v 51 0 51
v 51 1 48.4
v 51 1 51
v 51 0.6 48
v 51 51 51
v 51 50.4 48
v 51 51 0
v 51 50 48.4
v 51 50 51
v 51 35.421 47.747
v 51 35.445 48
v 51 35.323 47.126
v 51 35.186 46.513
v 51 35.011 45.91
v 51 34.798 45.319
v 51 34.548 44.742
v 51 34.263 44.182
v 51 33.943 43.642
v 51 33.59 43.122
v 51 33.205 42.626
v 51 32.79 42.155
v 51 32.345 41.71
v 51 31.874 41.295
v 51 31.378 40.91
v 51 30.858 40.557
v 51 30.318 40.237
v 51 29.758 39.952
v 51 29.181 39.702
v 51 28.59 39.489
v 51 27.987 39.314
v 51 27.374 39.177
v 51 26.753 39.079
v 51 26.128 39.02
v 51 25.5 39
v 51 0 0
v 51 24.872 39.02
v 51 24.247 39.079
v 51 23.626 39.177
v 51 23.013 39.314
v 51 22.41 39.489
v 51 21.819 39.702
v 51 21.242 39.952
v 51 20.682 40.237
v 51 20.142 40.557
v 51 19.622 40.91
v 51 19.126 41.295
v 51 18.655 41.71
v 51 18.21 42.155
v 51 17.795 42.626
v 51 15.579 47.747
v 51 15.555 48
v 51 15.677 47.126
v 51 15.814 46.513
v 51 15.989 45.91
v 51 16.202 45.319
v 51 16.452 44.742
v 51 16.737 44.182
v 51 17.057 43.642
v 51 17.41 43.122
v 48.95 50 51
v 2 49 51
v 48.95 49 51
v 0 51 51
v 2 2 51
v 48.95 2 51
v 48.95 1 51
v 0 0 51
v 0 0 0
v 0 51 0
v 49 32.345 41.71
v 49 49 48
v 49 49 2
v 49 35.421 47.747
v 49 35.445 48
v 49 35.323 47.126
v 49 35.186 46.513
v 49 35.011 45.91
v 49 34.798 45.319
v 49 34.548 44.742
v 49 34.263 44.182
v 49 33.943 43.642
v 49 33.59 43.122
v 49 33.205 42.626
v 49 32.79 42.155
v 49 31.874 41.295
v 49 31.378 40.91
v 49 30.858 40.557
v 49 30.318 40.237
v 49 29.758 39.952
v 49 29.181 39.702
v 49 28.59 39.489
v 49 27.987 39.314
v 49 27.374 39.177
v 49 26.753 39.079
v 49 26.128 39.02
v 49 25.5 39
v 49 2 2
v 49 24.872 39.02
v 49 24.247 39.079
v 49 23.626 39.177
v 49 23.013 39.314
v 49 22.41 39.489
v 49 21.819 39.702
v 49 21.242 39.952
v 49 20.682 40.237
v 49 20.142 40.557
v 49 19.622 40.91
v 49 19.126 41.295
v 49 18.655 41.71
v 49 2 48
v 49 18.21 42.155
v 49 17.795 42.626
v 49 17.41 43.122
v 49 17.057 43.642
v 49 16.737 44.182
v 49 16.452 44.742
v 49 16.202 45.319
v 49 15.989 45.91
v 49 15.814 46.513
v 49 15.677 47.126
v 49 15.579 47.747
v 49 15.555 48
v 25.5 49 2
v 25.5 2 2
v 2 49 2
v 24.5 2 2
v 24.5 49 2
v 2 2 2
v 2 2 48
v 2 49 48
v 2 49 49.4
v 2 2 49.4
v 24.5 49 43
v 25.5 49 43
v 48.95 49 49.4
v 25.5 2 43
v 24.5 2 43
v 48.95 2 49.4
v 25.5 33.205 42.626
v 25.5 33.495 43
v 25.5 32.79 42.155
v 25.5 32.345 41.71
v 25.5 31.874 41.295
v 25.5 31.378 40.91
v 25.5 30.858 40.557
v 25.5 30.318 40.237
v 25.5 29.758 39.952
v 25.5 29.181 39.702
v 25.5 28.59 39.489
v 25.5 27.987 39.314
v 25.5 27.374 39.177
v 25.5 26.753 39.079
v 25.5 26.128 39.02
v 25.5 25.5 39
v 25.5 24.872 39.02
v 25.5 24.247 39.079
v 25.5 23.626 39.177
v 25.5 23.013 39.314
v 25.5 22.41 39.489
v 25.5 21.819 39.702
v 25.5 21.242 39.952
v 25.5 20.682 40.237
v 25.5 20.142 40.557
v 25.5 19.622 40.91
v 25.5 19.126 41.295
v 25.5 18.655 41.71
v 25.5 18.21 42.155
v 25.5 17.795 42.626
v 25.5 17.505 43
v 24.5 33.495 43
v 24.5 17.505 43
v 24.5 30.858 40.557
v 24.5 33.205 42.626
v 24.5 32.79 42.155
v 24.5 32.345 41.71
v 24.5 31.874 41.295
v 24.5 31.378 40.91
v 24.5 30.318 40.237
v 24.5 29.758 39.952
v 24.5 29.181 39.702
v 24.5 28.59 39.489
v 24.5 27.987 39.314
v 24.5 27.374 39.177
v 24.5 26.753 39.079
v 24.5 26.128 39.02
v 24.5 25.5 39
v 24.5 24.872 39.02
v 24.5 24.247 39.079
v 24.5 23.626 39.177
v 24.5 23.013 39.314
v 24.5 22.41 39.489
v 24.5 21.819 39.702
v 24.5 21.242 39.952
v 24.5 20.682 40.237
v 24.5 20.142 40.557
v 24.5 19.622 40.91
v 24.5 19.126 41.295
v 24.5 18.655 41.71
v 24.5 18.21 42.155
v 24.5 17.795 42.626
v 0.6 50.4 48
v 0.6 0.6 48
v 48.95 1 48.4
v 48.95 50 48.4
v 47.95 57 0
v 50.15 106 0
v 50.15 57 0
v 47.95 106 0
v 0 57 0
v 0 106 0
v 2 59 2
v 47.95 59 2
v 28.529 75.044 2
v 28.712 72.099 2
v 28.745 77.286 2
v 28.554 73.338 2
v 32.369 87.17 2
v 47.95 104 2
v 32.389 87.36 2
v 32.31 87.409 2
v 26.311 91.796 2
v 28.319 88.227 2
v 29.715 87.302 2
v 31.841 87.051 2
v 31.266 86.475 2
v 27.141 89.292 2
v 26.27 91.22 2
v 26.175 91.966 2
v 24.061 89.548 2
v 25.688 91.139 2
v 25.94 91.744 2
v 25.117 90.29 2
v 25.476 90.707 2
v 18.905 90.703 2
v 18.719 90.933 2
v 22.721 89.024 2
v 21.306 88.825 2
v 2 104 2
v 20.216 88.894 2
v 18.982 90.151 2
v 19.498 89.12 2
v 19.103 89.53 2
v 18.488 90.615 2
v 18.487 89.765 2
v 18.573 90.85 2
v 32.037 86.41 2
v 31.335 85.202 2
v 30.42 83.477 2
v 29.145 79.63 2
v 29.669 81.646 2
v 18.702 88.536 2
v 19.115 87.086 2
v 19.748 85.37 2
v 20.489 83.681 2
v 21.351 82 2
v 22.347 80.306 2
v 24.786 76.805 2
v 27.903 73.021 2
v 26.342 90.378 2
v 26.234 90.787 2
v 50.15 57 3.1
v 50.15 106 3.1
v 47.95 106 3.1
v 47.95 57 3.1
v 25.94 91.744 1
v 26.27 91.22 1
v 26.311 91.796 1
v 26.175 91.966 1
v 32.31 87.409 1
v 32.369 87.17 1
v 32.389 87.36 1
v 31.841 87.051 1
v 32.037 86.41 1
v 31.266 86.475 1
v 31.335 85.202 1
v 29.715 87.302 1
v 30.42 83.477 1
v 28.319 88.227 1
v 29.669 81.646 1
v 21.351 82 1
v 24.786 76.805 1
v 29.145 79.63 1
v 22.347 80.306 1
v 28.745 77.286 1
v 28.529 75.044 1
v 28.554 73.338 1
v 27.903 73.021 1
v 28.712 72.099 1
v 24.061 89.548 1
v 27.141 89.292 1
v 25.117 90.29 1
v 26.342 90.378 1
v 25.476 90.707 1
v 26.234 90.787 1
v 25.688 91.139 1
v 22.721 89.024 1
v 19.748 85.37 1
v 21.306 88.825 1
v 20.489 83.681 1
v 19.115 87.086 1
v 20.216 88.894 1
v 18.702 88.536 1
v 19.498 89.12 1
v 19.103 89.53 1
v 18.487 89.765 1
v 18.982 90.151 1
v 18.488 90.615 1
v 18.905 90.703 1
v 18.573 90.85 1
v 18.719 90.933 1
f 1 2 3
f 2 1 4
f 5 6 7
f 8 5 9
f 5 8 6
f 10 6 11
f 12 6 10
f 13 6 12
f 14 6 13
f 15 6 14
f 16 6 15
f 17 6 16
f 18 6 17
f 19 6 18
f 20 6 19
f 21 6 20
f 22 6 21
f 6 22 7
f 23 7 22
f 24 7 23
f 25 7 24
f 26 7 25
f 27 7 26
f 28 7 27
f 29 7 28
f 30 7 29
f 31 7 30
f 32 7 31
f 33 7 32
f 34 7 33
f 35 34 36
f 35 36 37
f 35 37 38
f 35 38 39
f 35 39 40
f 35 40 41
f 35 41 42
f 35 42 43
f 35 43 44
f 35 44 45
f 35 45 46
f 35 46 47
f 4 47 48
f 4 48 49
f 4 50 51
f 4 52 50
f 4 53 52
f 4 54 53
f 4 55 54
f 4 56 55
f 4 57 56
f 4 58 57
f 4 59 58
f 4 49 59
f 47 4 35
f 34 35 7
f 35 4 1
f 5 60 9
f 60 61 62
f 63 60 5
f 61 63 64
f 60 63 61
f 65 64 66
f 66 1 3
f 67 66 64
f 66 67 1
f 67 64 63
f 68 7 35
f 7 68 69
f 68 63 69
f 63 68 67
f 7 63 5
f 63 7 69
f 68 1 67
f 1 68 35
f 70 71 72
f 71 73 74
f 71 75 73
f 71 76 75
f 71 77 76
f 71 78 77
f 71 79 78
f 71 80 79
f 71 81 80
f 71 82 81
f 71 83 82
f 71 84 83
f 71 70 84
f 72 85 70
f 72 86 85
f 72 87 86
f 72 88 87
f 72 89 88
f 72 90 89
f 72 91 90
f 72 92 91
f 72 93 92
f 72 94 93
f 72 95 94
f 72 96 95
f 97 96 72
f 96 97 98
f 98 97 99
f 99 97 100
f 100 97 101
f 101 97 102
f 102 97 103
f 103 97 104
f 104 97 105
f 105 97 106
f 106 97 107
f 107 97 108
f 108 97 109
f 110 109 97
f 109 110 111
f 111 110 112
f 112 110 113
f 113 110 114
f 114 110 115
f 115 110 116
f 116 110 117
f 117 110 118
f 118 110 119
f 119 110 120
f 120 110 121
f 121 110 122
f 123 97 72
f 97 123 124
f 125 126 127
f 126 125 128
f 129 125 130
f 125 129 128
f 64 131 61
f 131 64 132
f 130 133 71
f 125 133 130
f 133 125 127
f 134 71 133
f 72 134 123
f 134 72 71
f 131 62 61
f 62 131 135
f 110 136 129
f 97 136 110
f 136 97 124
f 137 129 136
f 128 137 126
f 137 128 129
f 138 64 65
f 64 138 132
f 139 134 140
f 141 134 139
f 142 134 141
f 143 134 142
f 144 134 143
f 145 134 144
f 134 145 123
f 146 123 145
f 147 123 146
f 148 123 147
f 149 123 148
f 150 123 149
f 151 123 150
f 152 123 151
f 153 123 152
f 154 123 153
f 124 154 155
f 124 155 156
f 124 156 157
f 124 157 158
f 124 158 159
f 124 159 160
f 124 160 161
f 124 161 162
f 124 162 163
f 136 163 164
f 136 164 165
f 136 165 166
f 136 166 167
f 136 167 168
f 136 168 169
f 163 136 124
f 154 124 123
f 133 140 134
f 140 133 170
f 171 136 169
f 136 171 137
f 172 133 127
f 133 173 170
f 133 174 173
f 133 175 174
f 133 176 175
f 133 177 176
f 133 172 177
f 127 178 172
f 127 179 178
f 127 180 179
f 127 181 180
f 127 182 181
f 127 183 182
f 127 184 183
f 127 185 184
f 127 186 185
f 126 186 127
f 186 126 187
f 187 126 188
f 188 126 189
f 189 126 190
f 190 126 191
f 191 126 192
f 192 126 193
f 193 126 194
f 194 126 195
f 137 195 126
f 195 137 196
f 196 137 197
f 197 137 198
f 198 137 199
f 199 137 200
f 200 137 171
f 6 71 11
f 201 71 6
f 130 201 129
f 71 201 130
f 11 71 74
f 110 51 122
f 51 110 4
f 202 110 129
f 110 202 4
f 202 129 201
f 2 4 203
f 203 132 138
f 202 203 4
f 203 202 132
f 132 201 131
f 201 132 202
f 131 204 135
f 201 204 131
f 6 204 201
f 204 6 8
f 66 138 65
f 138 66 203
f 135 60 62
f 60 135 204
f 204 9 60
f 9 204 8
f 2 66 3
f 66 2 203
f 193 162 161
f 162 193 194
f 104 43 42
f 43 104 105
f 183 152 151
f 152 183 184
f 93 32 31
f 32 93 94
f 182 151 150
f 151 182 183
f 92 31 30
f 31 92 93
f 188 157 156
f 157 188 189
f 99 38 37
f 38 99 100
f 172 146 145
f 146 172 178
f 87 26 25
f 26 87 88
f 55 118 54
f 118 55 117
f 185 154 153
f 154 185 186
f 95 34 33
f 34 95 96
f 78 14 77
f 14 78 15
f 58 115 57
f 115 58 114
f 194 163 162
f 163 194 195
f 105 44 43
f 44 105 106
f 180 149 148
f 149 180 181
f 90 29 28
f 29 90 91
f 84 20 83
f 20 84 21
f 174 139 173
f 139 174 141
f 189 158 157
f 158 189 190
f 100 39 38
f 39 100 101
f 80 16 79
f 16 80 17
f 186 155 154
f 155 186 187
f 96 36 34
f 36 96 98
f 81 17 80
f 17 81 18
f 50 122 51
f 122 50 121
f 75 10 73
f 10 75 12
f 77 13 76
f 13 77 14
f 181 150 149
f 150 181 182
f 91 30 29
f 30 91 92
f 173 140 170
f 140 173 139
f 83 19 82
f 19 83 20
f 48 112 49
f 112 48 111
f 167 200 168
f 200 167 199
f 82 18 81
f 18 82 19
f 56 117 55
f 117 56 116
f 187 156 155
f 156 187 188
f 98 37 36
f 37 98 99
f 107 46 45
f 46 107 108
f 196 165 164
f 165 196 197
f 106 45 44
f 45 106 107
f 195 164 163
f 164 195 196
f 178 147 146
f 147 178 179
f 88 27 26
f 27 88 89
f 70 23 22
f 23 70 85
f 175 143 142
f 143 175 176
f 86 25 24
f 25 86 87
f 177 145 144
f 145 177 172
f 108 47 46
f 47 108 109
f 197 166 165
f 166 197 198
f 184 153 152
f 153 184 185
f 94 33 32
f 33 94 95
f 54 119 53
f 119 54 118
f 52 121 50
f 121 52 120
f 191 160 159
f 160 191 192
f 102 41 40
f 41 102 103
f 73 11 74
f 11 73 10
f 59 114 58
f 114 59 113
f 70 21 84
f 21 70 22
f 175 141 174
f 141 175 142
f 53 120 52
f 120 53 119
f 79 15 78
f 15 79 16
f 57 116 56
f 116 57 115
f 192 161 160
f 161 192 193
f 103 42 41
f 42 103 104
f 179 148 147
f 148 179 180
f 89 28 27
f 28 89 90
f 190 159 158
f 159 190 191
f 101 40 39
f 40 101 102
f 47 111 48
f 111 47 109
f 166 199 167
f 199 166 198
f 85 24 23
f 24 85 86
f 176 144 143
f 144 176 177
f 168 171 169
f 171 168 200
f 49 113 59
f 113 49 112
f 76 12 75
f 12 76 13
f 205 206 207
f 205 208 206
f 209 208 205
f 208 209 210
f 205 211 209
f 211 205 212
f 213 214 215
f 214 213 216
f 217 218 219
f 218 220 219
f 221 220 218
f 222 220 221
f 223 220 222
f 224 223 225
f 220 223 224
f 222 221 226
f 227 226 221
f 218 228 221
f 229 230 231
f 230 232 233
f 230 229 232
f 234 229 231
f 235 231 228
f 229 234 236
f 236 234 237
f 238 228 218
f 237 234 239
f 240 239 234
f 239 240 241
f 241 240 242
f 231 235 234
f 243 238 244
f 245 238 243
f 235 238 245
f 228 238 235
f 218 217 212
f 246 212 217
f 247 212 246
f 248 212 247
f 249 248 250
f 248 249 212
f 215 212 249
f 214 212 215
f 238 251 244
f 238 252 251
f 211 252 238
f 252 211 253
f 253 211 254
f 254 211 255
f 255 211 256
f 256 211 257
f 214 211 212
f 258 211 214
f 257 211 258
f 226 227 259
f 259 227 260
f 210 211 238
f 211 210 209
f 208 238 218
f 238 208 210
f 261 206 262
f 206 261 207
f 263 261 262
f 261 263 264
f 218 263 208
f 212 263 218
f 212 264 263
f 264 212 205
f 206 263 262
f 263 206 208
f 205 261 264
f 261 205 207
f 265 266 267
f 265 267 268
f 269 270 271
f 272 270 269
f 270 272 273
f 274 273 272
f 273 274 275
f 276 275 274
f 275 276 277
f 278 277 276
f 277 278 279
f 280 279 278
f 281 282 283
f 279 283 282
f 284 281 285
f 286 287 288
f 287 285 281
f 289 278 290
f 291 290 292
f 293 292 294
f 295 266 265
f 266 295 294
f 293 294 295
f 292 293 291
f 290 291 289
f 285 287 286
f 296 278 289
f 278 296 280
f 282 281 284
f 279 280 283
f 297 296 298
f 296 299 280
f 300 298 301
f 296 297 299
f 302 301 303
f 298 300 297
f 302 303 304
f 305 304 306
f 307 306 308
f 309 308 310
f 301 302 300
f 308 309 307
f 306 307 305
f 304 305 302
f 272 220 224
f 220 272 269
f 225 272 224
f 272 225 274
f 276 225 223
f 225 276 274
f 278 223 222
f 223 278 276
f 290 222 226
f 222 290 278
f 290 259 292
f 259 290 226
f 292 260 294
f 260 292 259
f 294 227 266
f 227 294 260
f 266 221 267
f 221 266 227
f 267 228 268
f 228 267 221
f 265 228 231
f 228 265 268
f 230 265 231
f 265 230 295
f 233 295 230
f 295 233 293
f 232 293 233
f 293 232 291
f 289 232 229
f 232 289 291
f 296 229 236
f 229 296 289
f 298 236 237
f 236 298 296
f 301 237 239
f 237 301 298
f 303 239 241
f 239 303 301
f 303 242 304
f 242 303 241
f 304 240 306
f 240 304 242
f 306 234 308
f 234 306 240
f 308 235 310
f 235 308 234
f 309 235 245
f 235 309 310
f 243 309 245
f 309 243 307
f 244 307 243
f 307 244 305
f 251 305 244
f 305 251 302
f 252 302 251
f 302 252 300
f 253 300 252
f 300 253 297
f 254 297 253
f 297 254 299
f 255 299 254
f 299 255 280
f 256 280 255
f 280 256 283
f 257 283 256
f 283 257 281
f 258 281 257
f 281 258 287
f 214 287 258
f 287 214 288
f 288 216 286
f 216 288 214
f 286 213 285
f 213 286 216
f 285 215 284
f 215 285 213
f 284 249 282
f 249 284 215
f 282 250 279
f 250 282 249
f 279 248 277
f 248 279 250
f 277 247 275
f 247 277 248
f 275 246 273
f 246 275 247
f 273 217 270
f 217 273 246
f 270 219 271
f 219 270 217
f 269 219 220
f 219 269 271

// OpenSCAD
// file: carcassonne_box.scad
/**
 * @file carcassonne_box.scad
 * @author Conlan Wesson
 * Template for Carcossonne boxes.
 * @copyright Creative Commons Attribution-NonCommercial-ShareAlike 4.0
 */

mm = 1;
cm = 10*mm;

width = 47*mm;
thick = 2.5*mm;
wall = 2*mm;

/**
 * Lid for box.
 * @param count Number of cards.
 * @param columns Number of columns.
 * @param icon Path to icon DXF file.
 * @param rot Icon rotation in degrees.
 * @param mult Icon scale.
 * @param xoff X-offset of icon from center.
 * @param yoff Y-offset of icon from center.
 */
module carcassonne_lid(count, columns=1, icon=false, rot=0, mult=1, xoff=0, yoff=0, g=0){
	length = (thick * count) + ((width/2) - ((thick * count) % (width/2)));
	w = length+(1.5*wall)+.1;
	l = (width*columns)+wall;
	h = wall;
	d = 2;

	CubePoints = [
		[ 0-g, 0-g,   0 ],  //0
		[ w+g, 0-g,   0 ],  //1
		[ w+g, l+g,   0 ],  //2
		[ 0-g, l+g,   0 ],  //3
		[   d,   d, h+g ],  //4
		[   w,   d, h+g ],  //5
		[   w, l-d, h+g ],  //6
		[   d, l-d, h+g ]   //7
	];
	
	CubeFaces = [
		[0,1,2,3],  // bottom
		[4,5,1,0],  // front
		[7,6,5,4],  // top
		[5,6,2,1],  // right
		[6,7,3,2],  // back
		[7,4,0,3]   // left
	];
	
	
	difference(){
		union(){
			polyhedron( CubePoints, CubeFaces );
			translate([w-wall-.15,0,0]) cube([wall+.2,l, (1.5*wall)+.1]);
		}
		if(icon){
			translate([w/2+xoff,l/3+yoff,h-(wall/2)]){
				linear_extrude(height=(wall)+.1){
					rotate(rot) scale(mult) import(icon);
				}
			}
		}
	}
}

/**
 * Carcassonne card box.
 * @param count Number of cards.
 * @param dividers Array of divider positions.
 * @param columns Number of columns.
 */
module carcassonne_box(count, dividers=[], columns=1){
	length = (thick * count) + ((width/2) - ((thick * count) % (width/2)));
	difference(){
		union(){
			difference(){
				// Outer walls
				cube([length+(2*wall), (width*columns)+(2*wall), width+(2*wall)]);
				// Cavity
				translate([wall, wall, wall]){
					cube([length, width*columns, (width+wall)+.1]);
				}
			}
			// Dividers
			for(col = [0:columns-1]){
				for(div = dividers[col]){
					translate([(div*(width/2))+(wall/2), width*col+wall, 0]) cube([wall/2, width, width-(2*wall)]);
				}
				if(col > 0){
					translate([0, width*col+(wall/2), 0]) cube([length+(2*wall), wall/2, width-(2*wall)]);
				}
			}
		}
		union(){
			// Notch
			for(col = [0:columns-1]){
				translate([wall, wall+(width*col), wall]){
					translate([0, width/2, width])
					rotate([0, 90, 0]){
						cylinder(r=10, h=length+(2*wall), $fn=100);
					}
				}
			}
			// Track
			translate([wall/2,wall/2,width+wall/2]) carcassonne_lid(count, columns, g=0.4);
		}
	}
}
// main file
/**
 * @file flyingmachines.scad
 * @author Conlan Wesson
 * The Flying Machines Carcossonne box.
 * @copyright Creative Commons Attribution-NonCommercial-ShareAlike 4.0
 */

include <carcassonne_box.scad>

count = 16;
dividers = [[1]];
columns = 1;

carcassonne_box(count, dividers, columns);
translate([0,width*columns+10,0]) carcassonne_lid(count, columns, icon="flyingmachines.dxf", rot=90, mult=0.7, xoff=10, yoff=-4);
